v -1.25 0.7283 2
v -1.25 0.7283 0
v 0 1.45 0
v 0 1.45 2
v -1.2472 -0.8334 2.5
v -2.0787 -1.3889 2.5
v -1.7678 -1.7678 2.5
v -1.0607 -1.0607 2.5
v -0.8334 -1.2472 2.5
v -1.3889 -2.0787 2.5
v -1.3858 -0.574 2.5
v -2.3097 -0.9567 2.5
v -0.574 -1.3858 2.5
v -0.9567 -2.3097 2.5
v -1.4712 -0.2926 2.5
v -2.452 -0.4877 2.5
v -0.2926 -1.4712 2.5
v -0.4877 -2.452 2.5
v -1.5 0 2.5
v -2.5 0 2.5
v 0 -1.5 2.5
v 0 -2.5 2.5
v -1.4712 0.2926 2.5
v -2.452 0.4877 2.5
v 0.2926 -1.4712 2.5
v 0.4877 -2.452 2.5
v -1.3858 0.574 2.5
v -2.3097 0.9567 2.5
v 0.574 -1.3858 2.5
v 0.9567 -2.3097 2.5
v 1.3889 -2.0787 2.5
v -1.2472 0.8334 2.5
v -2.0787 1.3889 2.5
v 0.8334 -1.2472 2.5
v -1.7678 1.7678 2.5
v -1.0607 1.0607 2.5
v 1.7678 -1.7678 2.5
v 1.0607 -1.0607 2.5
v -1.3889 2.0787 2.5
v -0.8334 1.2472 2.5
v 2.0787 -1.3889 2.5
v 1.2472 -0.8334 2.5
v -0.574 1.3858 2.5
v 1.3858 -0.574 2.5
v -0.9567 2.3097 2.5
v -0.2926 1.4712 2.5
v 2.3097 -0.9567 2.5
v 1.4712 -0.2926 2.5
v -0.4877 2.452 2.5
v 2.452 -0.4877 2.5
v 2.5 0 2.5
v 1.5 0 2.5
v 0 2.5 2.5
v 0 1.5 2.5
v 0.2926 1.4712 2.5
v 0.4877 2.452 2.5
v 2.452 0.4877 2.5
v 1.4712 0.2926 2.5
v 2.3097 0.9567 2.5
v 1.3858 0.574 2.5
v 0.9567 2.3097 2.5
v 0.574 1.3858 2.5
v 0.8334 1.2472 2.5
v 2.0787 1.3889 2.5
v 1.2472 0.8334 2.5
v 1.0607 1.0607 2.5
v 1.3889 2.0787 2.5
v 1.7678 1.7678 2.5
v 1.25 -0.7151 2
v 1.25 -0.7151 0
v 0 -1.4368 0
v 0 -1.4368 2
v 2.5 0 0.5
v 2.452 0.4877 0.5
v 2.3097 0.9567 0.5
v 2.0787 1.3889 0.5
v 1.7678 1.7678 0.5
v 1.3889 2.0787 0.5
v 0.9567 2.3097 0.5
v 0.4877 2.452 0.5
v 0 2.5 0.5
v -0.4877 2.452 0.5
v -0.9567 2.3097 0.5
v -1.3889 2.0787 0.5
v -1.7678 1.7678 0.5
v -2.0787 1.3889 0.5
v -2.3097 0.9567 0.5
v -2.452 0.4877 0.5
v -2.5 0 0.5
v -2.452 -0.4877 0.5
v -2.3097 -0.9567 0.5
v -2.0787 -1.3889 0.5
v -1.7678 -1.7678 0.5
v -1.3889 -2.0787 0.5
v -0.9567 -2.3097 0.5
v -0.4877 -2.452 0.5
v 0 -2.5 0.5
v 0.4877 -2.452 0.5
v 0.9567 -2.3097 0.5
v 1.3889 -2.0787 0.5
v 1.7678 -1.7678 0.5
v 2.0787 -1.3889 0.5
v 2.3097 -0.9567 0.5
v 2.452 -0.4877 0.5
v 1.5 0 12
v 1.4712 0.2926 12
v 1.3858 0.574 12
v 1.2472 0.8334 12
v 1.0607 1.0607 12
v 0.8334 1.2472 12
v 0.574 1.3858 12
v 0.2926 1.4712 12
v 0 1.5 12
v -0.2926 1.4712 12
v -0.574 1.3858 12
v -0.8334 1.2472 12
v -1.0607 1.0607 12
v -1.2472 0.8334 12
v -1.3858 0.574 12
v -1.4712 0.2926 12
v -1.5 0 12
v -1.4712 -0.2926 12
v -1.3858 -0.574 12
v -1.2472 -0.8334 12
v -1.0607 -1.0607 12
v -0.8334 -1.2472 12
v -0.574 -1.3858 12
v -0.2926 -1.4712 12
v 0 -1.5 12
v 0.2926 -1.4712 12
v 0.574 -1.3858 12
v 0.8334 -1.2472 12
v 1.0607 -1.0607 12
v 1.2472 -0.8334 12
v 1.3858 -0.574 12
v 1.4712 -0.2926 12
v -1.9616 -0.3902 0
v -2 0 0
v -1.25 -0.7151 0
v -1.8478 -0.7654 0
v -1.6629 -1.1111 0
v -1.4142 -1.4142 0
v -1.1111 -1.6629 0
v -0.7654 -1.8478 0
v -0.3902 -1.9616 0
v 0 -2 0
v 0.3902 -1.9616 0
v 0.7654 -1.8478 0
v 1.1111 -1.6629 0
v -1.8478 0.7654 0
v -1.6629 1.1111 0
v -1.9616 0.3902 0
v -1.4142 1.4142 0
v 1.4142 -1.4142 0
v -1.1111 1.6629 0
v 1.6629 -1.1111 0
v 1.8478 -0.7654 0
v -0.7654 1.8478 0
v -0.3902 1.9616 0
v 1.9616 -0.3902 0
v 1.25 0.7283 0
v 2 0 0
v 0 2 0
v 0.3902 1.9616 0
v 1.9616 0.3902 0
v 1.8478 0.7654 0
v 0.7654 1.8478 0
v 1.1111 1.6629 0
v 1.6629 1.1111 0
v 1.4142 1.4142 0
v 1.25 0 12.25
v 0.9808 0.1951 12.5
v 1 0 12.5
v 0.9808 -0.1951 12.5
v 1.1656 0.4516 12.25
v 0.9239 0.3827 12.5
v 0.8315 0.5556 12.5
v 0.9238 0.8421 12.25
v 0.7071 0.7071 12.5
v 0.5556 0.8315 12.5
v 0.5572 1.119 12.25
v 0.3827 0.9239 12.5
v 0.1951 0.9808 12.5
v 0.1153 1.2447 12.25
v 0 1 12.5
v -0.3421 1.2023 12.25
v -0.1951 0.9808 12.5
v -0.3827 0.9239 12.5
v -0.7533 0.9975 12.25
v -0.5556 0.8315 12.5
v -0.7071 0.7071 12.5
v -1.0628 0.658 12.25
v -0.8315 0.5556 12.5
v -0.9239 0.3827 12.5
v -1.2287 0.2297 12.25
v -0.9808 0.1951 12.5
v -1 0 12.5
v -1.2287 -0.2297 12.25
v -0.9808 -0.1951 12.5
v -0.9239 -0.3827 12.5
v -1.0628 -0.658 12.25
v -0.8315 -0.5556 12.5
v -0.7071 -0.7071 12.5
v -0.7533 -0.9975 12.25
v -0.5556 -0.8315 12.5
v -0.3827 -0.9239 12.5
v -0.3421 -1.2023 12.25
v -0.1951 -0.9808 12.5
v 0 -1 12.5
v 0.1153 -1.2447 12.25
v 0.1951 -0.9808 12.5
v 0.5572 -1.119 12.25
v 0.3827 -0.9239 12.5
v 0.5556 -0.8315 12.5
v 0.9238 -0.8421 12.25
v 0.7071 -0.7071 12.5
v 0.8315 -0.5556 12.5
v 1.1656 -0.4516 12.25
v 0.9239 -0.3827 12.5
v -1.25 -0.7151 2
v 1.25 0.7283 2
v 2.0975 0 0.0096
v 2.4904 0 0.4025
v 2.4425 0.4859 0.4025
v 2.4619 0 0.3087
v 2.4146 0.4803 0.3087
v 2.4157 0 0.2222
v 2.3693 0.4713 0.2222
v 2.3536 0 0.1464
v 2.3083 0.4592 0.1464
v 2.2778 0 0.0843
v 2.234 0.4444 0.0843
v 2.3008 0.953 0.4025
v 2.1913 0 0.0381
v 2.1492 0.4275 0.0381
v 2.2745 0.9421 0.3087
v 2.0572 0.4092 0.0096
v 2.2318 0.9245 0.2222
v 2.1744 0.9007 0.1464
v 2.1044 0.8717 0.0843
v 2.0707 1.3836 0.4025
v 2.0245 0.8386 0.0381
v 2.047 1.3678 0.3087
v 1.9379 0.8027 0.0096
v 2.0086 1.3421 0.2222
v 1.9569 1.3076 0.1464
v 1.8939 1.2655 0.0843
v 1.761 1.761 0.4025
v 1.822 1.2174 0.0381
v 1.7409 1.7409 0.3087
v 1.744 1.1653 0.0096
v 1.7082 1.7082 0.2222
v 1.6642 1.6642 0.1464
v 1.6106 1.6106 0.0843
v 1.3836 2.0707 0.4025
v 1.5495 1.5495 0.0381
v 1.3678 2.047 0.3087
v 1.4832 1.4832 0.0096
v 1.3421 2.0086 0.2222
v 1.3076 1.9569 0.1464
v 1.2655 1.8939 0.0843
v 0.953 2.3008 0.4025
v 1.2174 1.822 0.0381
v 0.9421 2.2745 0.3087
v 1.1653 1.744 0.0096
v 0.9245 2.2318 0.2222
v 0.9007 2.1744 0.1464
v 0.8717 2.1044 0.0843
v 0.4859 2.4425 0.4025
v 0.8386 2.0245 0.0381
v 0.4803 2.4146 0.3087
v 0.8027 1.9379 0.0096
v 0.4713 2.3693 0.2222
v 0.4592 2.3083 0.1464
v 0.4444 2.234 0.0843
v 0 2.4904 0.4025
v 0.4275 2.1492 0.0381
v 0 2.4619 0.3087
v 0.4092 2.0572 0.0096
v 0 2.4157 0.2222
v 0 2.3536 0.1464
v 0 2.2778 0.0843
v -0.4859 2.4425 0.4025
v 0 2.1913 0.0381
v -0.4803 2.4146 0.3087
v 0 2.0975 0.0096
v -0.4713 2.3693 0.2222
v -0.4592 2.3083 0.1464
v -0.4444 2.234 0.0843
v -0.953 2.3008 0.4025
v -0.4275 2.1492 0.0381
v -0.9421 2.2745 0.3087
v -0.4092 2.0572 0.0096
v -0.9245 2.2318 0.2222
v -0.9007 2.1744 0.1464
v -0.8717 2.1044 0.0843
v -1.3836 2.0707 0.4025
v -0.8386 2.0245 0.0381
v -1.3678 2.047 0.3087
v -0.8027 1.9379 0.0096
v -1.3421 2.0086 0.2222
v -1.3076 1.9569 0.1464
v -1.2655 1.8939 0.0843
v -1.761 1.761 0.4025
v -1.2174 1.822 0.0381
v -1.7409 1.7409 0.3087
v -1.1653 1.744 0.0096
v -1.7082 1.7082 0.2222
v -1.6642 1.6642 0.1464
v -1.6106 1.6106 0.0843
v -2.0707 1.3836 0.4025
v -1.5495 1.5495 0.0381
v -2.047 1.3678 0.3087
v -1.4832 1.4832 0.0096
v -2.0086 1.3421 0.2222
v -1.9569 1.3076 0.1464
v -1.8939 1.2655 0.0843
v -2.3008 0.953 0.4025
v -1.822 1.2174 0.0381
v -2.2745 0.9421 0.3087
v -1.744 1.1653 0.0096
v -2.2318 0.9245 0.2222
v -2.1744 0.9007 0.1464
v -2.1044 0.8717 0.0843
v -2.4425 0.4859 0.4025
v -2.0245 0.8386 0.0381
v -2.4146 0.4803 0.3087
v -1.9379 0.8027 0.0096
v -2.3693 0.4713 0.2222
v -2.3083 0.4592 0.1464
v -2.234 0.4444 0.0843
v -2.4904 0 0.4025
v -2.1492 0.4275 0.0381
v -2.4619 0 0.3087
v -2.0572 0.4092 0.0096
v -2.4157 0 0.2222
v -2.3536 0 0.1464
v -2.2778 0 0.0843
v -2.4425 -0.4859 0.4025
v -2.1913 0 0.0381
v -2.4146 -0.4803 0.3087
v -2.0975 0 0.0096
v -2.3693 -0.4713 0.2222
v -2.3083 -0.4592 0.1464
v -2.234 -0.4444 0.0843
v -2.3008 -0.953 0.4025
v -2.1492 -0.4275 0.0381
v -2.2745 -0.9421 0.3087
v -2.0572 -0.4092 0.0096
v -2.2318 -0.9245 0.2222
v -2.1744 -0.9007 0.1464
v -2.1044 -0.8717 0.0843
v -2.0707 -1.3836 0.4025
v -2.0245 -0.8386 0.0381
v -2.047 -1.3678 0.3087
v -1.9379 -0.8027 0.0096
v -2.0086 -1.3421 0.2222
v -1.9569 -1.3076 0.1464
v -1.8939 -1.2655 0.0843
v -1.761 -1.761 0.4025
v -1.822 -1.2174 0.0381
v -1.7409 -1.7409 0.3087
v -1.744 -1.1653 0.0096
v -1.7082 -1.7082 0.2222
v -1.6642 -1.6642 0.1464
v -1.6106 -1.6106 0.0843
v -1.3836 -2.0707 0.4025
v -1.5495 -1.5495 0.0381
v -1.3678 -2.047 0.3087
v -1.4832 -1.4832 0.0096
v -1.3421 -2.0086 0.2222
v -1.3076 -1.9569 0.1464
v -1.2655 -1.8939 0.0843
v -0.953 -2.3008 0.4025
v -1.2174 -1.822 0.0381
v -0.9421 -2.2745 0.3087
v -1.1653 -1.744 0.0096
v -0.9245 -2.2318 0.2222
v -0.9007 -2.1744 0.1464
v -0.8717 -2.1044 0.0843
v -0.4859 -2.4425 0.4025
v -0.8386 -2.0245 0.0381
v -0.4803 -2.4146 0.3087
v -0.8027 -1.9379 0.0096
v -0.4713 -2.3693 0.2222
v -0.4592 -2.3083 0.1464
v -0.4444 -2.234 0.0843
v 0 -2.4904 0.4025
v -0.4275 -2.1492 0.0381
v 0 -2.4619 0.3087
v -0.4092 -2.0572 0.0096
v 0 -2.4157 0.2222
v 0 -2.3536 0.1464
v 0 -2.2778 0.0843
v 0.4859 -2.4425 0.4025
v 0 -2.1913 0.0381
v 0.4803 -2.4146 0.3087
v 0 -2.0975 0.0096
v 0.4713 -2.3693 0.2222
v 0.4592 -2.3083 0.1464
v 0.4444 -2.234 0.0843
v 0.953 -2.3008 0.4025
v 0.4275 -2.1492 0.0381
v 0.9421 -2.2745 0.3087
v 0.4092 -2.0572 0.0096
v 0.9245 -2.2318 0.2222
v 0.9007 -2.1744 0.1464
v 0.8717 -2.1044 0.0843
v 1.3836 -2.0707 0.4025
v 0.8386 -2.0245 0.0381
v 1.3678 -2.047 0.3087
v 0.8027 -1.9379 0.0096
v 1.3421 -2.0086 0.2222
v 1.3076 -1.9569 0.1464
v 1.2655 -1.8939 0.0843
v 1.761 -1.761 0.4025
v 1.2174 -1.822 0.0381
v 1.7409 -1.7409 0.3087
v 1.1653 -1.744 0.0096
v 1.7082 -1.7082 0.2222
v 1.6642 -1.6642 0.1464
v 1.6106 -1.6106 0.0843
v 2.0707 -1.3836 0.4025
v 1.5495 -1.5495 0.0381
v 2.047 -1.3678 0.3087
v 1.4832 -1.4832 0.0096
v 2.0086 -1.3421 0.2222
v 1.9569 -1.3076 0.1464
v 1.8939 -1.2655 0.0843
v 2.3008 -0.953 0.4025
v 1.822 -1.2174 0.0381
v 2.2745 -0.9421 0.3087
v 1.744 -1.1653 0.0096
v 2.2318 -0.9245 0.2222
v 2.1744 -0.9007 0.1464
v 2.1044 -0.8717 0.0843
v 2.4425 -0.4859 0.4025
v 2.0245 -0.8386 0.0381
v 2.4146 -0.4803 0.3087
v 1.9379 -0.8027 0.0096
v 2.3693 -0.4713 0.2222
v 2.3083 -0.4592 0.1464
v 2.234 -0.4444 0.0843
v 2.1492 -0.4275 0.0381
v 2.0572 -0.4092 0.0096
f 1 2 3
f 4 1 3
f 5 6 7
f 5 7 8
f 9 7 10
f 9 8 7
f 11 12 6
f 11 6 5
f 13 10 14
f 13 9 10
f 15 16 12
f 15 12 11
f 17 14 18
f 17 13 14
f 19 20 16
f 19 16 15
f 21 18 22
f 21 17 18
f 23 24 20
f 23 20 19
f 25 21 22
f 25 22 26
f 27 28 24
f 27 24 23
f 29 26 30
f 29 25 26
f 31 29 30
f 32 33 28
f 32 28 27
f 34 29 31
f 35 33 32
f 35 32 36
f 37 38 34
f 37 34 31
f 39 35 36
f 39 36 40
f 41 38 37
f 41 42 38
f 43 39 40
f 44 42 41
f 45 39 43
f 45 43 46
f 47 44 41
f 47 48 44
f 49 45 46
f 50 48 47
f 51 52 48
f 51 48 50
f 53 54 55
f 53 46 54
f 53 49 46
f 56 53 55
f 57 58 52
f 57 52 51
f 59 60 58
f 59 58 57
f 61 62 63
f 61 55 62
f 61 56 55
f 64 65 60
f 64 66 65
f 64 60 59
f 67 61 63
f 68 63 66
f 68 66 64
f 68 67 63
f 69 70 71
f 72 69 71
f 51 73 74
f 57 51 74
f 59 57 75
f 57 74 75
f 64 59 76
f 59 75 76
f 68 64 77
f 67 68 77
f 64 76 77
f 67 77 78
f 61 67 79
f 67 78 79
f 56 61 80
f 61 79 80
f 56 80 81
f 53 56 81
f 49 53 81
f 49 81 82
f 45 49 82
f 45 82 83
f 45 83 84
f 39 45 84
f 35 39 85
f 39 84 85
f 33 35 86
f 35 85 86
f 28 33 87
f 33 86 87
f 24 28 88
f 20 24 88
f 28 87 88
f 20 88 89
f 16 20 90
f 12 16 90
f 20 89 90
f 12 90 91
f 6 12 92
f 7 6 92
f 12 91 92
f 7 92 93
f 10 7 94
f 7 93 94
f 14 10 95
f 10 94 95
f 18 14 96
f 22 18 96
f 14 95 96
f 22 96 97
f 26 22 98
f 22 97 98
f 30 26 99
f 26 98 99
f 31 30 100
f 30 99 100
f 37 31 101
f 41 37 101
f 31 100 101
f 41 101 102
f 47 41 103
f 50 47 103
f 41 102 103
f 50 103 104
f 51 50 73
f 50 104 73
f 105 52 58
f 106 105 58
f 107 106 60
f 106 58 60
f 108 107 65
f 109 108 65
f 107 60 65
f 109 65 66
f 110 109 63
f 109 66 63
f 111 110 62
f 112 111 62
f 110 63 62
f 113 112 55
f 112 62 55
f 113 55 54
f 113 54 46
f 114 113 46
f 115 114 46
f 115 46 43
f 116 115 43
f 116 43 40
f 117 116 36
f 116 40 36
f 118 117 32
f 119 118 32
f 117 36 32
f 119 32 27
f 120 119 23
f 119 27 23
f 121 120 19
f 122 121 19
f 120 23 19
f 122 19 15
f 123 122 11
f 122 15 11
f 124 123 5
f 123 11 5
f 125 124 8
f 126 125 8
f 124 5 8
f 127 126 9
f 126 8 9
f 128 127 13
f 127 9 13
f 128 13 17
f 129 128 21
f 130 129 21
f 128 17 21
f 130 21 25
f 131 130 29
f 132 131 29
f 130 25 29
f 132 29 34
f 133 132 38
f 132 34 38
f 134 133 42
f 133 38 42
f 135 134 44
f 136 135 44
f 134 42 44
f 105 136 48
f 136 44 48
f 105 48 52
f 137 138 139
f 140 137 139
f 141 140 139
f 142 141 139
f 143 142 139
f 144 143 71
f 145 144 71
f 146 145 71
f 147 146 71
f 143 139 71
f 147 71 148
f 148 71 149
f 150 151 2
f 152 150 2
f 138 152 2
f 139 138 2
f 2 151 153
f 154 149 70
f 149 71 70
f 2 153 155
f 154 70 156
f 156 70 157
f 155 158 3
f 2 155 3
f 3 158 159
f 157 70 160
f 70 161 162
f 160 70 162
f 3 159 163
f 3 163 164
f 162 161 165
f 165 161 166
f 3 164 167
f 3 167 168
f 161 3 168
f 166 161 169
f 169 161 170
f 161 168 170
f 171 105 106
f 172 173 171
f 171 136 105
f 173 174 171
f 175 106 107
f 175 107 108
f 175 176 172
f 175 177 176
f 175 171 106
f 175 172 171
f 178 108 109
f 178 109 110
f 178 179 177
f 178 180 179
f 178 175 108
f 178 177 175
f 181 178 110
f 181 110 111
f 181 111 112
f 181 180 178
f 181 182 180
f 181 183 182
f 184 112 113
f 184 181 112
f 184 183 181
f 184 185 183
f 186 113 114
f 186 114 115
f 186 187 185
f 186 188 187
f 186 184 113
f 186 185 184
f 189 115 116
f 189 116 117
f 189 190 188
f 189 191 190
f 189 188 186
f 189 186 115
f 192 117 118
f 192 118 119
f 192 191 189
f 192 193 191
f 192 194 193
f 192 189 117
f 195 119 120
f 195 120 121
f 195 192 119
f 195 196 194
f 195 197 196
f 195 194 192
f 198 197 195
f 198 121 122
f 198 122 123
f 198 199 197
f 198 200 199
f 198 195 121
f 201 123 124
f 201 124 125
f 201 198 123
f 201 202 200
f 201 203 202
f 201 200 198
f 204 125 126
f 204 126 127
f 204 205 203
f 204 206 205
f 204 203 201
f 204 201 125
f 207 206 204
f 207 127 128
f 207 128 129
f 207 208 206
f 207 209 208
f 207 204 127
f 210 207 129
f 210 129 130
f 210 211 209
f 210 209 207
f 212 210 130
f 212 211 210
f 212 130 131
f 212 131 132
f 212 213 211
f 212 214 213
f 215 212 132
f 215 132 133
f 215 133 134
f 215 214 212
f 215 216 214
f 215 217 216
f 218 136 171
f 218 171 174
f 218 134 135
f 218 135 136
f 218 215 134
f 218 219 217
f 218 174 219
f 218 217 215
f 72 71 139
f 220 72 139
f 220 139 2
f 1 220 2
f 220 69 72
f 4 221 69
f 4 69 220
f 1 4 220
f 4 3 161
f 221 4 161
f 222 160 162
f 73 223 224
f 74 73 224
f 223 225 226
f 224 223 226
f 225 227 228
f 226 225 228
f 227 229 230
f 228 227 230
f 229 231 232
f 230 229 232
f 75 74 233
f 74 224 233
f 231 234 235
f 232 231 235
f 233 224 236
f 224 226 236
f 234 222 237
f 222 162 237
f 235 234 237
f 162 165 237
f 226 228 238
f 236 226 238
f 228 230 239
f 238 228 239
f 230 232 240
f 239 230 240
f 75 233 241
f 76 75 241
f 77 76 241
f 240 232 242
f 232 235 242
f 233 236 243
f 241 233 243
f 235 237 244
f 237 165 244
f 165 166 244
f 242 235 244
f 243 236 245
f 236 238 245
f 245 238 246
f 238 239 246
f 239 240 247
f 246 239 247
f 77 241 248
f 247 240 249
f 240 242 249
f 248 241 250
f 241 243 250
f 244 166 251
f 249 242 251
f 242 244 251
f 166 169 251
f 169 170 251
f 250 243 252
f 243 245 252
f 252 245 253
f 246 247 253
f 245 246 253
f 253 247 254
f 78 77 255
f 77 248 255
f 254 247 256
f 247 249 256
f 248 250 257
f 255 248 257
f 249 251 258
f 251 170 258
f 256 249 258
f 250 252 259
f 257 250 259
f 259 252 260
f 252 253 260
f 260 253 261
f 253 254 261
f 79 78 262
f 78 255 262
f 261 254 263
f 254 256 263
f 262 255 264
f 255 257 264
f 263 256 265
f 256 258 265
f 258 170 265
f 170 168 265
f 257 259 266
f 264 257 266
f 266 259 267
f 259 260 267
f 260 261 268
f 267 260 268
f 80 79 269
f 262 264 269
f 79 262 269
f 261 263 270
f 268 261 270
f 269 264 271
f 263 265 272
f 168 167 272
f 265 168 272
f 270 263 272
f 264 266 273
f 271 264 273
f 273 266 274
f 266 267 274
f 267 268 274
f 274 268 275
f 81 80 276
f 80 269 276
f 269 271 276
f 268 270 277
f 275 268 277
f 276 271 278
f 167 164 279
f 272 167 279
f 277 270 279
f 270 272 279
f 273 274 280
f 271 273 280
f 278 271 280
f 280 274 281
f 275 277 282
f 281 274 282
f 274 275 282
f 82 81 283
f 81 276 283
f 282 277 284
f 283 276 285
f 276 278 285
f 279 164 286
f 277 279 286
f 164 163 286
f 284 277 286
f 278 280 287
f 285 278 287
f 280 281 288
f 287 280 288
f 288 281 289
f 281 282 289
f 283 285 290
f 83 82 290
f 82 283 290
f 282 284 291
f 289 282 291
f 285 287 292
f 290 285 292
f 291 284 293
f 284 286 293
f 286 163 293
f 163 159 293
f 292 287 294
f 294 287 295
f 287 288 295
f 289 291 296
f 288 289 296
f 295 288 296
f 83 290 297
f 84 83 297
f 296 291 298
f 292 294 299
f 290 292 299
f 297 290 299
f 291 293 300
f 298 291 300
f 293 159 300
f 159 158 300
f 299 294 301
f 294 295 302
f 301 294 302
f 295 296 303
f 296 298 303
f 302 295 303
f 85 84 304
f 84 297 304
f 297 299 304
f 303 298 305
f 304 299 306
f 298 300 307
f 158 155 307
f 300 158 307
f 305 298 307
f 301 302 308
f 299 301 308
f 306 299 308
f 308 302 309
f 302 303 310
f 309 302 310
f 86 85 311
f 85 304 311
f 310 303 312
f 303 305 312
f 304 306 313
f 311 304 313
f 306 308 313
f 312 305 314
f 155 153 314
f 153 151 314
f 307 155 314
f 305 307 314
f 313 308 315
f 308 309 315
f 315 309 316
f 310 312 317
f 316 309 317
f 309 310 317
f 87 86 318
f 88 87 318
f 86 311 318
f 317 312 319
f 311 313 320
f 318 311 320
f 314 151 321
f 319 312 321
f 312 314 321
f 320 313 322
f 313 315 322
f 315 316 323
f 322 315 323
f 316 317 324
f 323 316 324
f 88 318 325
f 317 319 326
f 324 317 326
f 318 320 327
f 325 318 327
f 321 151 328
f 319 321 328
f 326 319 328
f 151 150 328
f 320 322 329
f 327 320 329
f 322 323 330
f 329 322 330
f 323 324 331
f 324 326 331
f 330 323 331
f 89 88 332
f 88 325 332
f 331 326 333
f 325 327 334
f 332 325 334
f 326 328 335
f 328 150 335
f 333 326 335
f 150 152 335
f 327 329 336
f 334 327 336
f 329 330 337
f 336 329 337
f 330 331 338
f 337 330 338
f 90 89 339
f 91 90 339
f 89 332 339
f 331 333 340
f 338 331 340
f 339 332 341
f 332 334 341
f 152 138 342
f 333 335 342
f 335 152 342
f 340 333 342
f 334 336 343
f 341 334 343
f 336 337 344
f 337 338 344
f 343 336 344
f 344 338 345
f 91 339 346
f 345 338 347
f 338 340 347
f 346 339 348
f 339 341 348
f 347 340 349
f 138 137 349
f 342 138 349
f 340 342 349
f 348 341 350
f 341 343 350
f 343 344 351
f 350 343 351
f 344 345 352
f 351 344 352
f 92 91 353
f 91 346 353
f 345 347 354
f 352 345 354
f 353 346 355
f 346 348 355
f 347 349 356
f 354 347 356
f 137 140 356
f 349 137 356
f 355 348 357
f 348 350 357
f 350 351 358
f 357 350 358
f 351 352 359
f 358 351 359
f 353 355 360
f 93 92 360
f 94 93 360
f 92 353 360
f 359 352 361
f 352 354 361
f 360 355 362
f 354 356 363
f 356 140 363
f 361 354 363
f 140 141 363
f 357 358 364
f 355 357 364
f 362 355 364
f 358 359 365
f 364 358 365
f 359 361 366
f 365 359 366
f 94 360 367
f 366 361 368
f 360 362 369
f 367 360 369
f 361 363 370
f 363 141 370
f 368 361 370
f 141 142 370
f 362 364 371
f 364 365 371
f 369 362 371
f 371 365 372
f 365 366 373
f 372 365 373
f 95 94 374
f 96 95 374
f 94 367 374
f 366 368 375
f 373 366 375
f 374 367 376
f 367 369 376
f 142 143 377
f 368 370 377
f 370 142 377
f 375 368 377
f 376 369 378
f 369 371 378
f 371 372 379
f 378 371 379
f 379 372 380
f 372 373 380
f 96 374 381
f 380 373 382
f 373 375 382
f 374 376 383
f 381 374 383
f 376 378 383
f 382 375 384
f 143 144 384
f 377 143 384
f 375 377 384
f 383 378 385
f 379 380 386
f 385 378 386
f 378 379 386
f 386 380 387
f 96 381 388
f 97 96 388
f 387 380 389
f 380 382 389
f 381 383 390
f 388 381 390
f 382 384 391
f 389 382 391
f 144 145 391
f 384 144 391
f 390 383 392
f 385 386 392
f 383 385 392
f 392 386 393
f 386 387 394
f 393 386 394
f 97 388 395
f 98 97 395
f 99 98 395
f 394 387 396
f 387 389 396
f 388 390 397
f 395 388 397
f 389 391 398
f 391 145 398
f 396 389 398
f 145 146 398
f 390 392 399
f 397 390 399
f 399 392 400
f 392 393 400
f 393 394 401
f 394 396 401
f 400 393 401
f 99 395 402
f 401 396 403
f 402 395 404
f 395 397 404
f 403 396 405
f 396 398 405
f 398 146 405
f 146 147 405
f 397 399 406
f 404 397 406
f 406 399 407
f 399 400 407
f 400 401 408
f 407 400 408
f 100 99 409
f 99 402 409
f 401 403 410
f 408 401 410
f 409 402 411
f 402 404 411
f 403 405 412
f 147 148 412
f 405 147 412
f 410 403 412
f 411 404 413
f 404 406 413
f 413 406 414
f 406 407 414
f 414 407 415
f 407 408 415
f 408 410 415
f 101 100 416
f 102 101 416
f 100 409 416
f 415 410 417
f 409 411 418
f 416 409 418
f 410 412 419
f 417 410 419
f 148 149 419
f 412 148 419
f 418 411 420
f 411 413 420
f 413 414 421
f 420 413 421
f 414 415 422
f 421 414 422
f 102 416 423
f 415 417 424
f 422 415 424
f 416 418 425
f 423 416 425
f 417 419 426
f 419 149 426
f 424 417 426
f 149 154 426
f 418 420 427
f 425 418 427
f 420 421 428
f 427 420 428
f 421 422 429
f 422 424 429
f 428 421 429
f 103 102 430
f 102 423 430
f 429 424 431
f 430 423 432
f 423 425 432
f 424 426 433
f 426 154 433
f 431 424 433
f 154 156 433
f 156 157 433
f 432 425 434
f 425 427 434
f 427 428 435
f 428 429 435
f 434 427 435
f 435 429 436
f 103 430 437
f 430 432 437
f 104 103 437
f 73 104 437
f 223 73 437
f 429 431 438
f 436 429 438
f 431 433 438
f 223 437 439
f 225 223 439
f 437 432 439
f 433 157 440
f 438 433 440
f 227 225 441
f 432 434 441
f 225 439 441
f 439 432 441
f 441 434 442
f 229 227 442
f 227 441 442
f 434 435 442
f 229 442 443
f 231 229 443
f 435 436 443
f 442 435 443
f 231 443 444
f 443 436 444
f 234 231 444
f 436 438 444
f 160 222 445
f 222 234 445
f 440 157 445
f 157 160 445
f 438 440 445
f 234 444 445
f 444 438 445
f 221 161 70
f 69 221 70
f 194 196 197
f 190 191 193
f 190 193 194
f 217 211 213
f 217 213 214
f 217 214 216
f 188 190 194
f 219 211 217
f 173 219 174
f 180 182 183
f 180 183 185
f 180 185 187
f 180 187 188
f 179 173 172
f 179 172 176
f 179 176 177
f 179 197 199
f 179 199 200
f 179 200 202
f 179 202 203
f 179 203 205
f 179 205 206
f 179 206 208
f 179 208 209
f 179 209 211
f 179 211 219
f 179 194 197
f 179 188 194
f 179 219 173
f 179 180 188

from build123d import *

# Parameters (mm, degrees)
ESQUISSE1_R             = 2.5
BASE_EXTRUSION_DEPTH    = 2.5
ESQUISSE2_R             = 1.5
BOSS_EXTRU_1_DEPTH      = 10
ENL_V_MAT_EXTRU_1_DEPTH = 2
CONG_1_R                = 0.5
CHANFREIN1_SIZE         = 0.5


with BuildPart() as part:
    # Esquisse1 → Base-Extrusion (new body)
    with BuildSketch(Plane.XY):
        Circle(ESQUISSE1_R)
    extrude(amount=BASE_EXTRUSION_DEPTH)

    # Esquisse2 → Boss.-Extru.1 (add)
    with BuildSketch(Plane.XY.offset(2.5)):
        Circle(ESQUISSE2_R)
    extrude(amount=BOSS_EXTRU_1_DEPTH)

    # Esquisse3 → Enlèv. mat.-Extru.1 (cut)
    with BuildSketch(Plane(origin=(0, 0, 0), x_dir=(-1, 0, 0), z_dir=(0, 0, -1))):
        Polygon((0, 1.45), (-1.25, 0.728312164), (-1.25, -0.715063509), (0, -1.436751346), (1.25, -0.715063509), (1.25, 0.728312164), align=None)
    extrude(amount=-ENL_V_MAT_EXTRU_1_DEPTH, mode=Mode.SUBTRACT)

    # Congé1
    cong_1_edges = [part.edges().sort_by_distance(p)[0] for p in [
        (-2.5, 0, 0),
    ]]
    fillet(cong_1_edges, radius=CONG_1_R)

    # Chanfrein1
    chanfrein1_edges = [part.edges().sort_by_distance(p)[0] for p in [
        (-1.5, 0, 12.5),
    ]]
    chamfer(chanfrein1_edges, length=CHANFREIN1_SIZE)


solid = part.part
